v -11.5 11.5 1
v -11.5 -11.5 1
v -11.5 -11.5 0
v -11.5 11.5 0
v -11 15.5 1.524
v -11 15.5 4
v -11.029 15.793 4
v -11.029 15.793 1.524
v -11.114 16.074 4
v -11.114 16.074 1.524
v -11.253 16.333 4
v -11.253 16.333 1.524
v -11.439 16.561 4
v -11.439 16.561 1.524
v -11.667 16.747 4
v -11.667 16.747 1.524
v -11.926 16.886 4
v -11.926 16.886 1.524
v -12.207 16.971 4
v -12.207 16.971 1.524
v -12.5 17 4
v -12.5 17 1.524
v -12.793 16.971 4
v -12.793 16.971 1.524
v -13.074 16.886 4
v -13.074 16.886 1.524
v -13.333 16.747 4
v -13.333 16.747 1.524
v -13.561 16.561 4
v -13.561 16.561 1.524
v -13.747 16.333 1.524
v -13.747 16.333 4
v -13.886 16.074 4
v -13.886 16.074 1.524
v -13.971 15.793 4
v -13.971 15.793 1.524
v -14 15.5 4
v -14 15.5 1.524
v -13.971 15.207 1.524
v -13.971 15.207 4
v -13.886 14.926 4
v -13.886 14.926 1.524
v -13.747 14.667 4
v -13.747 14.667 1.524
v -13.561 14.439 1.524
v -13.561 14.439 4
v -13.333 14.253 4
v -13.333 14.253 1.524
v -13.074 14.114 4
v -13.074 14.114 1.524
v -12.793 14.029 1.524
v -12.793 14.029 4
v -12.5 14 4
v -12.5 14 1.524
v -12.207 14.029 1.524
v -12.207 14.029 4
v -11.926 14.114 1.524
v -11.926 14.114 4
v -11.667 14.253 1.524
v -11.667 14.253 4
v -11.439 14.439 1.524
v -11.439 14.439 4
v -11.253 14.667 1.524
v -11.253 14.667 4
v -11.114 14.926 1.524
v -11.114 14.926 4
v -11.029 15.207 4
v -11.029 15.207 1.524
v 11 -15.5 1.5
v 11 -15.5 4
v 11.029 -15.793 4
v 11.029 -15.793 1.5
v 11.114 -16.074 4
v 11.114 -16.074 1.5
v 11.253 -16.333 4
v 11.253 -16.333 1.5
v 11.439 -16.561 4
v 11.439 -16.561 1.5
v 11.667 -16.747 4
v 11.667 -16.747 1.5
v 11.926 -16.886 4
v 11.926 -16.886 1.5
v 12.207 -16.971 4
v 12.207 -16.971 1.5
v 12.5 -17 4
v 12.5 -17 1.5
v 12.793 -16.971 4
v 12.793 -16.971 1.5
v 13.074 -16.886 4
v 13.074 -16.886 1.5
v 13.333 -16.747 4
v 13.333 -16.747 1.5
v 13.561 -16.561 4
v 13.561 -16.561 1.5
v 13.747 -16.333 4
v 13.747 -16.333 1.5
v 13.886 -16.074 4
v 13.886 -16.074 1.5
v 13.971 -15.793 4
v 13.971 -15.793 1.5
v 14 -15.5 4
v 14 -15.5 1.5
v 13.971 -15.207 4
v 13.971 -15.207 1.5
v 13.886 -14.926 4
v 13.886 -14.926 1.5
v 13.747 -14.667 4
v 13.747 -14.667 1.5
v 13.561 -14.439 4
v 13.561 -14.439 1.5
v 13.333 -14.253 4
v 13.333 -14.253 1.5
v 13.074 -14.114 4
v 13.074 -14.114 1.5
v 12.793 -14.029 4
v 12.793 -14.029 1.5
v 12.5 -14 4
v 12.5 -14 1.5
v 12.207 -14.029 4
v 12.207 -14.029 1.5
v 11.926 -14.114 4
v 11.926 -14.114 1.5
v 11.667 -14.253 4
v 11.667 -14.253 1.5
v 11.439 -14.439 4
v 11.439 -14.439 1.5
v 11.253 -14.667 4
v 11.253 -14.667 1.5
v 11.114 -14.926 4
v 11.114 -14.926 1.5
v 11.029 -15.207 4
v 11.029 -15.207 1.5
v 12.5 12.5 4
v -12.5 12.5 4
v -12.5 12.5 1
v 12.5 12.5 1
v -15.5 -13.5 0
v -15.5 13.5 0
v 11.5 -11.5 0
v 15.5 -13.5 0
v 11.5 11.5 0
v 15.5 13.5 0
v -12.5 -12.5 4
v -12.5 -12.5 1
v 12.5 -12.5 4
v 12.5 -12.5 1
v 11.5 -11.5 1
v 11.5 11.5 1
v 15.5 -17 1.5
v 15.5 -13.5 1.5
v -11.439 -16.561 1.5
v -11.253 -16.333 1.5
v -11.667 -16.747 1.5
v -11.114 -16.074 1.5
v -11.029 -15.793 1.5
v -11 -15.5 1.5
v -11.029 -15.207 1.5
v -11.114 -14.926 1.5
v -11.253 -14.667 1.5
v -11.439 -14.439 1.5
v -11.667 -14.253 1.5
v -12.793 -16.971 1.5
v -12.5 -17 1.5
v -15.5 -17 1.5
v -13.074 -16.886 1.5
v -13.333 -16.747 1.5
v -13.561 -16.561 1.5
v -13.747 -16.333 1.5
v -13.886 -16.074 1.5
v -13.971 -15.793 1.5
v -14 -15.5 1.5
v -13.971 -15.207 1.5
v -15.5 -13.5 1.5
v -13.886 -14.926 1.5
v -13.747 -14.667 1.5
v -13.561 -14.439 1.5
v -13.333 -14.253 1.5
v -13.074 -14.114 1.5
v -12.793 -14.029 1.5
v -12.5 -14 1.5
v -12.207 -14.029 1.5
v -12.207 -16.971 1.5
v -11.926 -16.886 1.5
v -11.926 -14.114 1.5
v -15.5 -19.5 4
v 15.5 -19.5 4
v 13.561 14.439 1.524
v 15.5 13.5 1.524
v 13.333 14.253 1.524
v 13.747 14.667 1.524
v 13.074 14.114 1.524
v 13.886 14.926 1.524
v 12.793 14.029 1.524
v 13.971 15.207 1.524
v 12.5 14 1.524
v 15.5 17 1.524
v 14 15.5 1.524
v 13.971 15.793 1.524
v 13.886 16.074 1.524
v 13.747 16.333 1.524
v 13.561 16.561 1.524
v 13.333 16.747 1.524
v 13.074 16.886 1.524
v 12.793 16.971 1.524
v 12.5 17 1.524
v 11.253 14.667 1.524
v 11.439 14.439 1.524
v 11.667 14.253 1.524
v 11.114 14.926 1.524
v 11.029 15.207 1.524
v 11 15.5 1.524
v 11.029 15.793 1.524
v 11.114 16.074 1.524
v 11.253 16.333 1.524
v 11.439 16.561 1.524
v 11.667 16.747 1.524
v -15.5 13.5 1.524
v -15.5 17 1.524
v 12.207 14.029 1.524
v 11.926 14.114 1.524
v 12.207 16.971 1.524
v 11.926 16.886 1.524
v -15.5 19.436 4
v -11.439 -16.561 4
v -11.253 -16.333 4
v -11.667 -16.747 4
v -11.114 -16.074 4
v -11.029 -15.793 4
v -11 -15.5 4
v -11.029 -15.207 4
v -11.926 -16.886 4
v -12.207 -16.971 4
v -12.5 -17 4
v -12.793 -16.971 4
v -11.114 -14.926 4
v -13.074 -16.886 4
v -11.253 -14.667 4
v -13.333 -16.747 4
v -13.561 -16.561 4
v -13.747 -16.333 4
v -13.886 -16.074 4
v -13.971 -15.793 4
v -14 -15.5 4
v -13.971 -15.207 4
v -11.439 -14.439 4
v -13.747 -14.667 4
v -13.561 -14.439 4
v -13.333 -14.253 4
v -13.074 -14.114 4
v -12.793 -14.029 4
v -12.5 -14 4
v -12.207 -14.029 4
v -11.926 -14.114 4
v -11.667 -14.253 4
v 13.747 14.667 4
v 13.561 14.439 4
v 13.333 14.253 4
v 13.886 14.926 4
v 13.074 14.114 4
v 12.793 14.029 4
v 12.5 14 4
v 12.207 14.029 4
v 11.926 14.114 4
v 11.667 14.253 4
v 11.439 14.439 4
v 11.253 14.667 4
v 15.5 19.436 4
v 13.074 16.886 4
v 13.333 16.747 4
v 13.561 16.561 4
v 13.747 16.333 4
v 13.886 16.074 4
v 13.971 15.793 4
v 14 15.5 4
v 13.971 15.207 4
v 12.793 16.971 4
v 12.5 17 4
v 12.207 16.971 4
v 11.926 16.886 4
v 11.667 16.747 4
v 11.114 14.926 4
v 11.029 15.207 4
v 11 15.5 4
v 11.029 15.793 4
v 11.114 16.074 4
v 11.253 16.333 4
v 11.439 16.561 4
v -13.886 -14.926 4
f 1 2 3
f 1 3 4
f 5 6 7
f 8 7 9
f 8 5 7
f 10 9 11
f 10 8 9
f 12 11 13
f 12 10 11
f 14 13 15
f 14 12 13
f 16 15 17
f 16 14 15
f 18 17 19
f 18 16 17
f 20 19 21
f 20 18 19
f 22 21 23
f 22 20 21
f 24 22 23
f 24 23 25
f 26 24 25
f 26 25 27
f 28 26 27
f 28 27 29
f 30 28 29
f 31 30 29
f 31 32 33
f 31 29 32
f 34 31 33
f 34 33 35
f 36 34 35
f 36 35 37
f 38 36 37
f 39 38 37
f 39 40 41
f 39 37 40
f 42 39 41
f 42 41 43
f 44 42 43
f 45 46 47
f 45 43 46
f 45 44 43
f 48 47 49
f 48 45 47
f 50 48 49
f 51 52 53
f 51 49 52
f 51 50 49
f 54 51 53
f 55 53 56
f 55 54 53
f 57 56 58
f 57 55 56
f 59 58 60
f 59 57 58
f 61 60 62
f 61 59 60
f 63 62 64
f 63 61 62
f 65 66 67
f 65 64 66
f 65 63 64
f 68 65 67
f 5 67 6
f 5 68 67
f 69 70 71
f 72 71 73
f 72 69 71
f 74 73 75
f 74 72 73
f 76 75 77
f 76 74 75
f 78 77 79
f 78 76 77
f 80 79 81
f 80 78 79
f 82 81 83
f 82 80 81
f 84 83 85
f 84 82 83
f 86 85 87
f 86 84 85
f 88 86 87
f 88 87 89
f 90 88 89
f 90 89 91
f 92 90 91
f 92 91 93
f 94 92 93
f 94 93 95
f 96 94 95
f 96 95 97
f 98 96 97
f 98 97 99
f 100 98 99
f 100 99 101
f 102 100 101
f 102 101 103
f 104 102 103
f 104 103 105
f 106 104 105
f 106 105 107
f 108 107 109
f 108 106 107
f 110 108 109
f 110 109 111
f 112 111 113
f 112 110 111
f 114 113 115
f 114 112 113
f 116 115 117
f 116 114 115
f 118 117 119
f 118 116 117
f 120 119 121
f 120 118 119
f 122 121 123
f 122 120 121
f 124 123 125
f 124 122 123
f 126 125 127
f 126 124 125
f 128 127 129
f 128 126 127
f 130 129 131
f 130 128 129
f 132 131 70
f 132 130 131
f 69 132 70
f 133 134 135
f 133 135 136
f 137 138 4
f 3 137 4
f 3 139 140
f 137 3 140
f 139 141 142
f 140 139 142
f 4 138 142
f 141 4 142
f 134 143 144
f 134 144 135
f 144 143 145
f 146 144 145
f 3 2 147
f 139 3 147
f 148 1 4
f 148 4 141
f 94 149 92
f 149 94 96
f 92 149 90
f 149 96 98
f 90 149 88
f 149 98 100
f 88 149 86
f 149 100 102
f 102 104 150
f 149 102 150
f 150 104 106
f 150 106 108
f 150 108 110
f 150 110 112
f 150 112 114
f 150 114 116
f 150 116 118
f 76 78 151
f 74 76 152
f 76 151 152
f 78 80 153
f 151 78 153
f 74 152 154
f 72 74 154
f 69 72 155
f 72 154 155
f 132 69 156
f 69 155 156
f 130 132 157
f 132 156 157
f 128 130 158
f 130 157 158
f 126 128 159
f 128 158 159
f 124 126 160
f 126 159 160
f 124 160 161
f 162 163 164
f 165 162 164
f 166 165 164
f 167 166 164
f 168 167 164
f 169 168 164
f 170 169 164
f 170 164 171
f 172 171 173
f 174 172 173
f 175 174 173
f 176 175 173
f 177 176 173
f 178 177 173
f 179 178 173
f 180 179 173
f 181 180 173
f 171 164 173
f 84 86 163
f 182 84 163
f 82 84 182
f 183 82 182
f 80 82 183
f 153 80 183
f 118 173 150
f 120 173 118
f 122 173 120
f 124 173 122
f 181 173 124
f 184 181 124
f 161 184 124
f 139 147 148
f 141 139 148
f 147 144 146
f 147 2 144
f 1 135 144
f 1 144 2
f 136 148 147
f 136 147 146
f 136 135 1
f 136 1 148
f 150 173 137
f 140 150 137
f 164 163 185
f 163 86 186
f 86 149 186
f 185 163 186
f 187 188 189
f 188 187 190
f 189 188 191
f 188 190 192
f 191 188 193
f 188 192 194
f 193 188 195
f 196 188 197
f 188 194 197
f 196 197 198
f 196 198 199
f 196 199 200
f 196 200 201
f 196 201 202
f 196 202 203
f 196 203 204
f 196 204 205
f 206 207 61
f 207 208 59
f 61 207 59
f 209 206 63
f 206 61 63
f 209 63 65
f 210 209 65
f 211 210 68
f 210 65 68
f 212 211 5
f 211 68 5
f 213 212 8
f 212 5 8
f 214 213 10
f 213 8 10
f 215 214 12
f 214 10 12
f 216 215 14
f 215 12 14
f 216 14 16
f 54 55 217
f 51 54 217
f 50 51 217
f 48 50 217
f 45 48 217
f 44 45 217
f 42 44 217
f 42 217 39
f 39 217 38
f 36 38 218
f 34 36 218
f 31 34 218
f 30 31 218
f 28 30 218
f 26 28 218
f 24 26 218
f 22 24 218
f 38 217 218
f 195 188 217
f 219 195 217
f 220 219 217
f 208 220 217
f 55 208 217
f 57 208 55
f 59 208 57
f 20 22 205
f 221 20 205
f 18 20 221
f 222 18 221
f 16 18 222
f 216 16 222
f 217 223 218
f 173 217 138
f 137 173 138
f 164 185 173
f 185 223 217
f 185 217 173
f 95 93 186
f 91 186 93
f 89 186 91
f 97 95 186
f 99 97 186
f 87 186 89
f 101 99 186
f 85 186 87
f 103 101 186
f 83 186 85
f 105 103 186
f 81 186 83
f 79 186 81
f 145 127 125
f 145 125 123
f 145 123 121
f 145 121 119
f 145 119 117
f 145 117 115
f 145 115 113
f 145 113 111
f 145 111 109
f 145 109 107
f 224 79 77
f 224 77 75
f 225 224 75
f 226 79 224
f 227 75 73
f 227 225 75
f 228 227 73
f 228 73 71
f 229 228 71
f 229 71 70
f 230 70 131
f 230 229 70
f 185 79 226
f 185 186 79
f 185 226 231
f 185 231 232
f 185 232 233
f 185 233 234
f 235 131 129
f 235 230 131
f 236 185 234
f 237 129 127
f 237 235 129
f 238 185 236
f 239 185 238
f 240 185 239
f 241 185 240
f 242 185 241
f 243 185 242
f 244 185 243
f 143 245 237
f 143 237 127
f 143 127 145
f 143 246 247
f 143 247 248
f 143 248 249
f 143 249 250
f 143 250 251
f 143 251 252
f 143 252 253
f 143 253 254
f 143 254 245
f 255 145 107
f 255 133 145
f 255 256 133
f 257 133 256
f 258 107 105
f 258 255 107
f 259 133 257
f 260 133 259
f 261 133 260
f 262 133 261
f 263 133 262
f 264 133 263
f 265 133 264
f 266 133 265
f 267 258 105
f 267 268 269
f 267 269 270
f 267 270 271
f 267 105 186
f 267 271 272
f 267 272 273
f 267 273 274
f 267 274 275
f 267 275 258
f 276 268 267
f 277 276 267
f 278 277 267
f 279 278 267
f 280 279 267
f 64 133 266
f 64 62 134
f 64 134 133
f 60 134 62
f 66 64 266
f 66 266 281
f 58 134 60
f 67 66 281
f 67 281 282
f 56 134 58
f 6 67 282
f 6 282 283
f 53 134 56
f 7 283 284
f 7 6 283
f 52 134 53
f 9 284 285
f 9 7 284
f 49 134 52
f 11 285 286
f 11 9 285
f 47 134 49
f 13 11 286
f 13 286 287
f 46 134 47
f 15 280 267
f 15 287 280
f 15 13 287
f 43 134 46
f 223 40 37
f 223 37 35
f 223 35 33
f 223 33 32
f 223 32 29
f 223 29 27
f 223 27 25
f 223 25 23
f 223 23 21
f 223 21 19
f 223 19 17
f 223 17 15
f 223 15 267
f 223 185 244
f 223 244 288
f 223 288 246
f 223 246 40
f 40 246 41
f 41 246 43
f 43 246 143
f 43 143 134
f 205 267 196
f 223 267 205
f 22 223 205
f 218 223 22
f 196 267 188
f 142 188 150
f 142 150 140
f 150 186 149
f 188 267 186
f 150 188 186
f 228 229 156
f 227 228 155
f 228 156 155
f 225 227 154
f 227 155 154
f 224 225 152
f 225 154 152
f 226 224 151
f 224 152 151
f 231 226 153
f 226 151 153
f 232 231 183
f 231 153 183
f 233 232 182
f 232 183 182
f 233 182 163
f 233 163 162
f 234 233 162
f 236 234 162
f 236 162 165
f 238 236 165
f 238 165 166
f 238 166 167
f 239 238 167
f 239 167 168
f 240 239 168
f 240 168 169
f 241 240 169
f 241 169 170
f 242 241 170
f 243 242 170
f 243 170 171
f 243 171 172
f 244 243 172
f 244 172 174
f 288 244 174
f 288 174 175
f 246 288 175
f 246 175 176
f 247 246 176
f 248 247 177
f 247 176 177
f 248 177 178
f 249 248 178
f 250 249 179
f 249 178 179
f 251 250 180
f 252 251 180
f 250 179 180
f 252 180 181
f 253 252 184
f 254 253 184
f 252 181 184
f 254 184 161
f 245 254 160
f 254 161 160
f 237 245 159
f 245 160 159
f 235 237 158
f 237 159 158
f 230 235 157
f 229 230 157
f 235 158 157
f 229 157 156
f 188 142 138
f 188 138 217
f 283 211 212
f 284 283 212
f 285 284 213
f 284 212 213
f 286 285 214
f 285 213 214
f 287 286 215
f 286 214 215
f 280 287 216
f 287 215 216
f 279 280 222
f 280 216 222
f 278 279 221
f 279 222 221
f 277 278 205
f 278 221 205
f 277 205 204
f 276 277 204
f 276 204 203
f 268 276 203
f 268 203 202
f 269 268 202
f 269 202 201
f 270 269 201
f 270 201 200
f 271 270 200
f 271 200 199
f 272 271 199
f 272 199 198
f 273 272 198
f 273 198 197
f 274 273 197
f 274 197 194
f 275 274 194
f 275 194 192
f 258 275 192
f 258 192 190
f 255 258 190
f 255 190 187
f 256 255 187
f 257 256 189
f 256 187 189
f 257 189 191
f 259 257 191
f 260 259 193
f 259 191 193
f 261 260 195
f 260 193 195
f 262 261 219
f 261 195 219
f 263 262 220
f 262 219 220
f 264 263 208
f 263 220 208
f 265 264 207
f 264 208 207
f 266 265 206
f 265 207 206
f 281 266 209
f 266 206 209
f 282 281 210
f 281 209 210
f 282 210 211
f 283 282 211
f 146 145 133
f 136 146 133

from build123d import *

# Parameters (mm, degrees)
SKETCH3_W               = 31
SKETCH3_H               = 31
BOSS_EXTRUDE2_DEPTH     = 4
SKETCH4_W               = 25
SKETCH4_H               = 25
CUT_EXTRUDE1_DEPTH      = 3
SKETCH5_W               = 23
SKETCH5_H               = 23
CUT_EXTRUDE2_DEPTH      = 5
SKETCH9_R               = 1.5
CUT_EXTRUDE3_DEPTH      = 10
MIRROR3_COPY_1_SKETCH_R = 1.5
MIRROR3_COPY_1_DEPTH    = 10
CUT_EXTRUDE4_DEPTH      = 37.84087404


with BuildPart() as part:
    # Sketch3 → Boss-Extrude2 (new body)
    with BuildSketch(Plane.XY):
        Rectangle(SKETCH3_W, SKETCH3_H)
    extrude(amount=BOSS_EXTRUDE2_DEPTH)

    # Sketch4 → Cut-Extrude1 (cut)
    with BuildSketch(Plane.XY.offset(4)):
        Rectangle(SKETCH4_W, SKETCH4_H)
    extrude(amount=-CUT_EXTRUDE1_DEPTH, mode=Mode.SUBTRACT)

    # Sketch5 → Cut-Extrude2 (cut)
    with BuildSketch(Plane.XY.offset(1)):
        Rectangle(SKETCH5_W, SKETCH5_H)
    extrude(amount=-CUT_EXTRUDE2_DEPTH, mode=Mode.SUBTRACT)

    # Sweep1: sweep along a curve in space
    with BuildLine() as sweep1_path:
        Line((-15.5, -15.5, 4), (15.5, -15.5, 4))
    # Sketch6 → Sweep1 (sweep)
    with BuildSketch(Plane.ZY.offset(15.5)):
        Polygon((4, -15.5), (4, -19.5), (0, -15.5), align=None)
    sweep(path=sweep1_path.line)

    # Sweep2: sweep along a curve in space
    with BuildLine() as sweep2_path:
        Line((15.5, 15.5, 0), (-15.5, 15.5, 0))
    # Sketch8 → Sweep2 (sweep)
    with BuildSketch(Plane.ZY.offset(15.5)):
        Polygon((0, 15.5), (4, 19.43634716), (4, 15.5), align=None)
    sweep(path=sweep2_path.line)

    # Sketch9 → Cut-Extrude3 (cut)
    with BuildSketch(Plane(origin=(0, 0, 0), x_dir=(-1, 0, 0), z_dir=(0, 0, -1))):
        with Locations((-12.5, 15.5)):
            Circle(SKETCH9_R)
    cut_extrude3 = extrude(amount=-CUT_EXTRUDE3_DEPTH, mode=Mode.SUBTRACT)

    # Mirror1: Cut-Extrude3 across plane
    add(cut_extrude3.mirror(Plane(origin=(0, 0, 0), x_dir=(0, 0, 1), z_dir=(1, 0, 0))), mode=Mode.SUBTRACT)

    # Mirror3: Cut-Extrude3 across plane
    add(cut_extrude3.mirror(Plane.ZX), mode=Mode.SUBTRACT)

    # Mirror3 copy 1 sketch → Mirror3 copy 1 (cut)
    with BuildSketch(Plane(origin=(0, 0, 0), x_dir=(1, 0, 0), z_dir=(0, 0, -1))):
        with Locations((-12.5, 15.5)):
            Circle(MIRROR3_COPY_1_SKETCH_R)
    extrude(amount=-MIRROR3_COPY_1_DEPTH, mode=Mode.SUBTRACT)

    # Sketch10 → Cut-Extrude4 (cut, through all)
    with BuildSketch(Plane.ZY.offset(15.5)):
        Polygon((0, -15.5), (1.5, -17), (1.5, -13.5), (0, -13.5), align=None)
        Polygon((1.524255803, 17), (0, 15.5), (0, 13.5), (1.524255803, 13.5), align=None)
    extrude(amount=-CUT_EXTRUDE4_DEPTH, mode=Mode.SUBTRACT)


solid = part.part
